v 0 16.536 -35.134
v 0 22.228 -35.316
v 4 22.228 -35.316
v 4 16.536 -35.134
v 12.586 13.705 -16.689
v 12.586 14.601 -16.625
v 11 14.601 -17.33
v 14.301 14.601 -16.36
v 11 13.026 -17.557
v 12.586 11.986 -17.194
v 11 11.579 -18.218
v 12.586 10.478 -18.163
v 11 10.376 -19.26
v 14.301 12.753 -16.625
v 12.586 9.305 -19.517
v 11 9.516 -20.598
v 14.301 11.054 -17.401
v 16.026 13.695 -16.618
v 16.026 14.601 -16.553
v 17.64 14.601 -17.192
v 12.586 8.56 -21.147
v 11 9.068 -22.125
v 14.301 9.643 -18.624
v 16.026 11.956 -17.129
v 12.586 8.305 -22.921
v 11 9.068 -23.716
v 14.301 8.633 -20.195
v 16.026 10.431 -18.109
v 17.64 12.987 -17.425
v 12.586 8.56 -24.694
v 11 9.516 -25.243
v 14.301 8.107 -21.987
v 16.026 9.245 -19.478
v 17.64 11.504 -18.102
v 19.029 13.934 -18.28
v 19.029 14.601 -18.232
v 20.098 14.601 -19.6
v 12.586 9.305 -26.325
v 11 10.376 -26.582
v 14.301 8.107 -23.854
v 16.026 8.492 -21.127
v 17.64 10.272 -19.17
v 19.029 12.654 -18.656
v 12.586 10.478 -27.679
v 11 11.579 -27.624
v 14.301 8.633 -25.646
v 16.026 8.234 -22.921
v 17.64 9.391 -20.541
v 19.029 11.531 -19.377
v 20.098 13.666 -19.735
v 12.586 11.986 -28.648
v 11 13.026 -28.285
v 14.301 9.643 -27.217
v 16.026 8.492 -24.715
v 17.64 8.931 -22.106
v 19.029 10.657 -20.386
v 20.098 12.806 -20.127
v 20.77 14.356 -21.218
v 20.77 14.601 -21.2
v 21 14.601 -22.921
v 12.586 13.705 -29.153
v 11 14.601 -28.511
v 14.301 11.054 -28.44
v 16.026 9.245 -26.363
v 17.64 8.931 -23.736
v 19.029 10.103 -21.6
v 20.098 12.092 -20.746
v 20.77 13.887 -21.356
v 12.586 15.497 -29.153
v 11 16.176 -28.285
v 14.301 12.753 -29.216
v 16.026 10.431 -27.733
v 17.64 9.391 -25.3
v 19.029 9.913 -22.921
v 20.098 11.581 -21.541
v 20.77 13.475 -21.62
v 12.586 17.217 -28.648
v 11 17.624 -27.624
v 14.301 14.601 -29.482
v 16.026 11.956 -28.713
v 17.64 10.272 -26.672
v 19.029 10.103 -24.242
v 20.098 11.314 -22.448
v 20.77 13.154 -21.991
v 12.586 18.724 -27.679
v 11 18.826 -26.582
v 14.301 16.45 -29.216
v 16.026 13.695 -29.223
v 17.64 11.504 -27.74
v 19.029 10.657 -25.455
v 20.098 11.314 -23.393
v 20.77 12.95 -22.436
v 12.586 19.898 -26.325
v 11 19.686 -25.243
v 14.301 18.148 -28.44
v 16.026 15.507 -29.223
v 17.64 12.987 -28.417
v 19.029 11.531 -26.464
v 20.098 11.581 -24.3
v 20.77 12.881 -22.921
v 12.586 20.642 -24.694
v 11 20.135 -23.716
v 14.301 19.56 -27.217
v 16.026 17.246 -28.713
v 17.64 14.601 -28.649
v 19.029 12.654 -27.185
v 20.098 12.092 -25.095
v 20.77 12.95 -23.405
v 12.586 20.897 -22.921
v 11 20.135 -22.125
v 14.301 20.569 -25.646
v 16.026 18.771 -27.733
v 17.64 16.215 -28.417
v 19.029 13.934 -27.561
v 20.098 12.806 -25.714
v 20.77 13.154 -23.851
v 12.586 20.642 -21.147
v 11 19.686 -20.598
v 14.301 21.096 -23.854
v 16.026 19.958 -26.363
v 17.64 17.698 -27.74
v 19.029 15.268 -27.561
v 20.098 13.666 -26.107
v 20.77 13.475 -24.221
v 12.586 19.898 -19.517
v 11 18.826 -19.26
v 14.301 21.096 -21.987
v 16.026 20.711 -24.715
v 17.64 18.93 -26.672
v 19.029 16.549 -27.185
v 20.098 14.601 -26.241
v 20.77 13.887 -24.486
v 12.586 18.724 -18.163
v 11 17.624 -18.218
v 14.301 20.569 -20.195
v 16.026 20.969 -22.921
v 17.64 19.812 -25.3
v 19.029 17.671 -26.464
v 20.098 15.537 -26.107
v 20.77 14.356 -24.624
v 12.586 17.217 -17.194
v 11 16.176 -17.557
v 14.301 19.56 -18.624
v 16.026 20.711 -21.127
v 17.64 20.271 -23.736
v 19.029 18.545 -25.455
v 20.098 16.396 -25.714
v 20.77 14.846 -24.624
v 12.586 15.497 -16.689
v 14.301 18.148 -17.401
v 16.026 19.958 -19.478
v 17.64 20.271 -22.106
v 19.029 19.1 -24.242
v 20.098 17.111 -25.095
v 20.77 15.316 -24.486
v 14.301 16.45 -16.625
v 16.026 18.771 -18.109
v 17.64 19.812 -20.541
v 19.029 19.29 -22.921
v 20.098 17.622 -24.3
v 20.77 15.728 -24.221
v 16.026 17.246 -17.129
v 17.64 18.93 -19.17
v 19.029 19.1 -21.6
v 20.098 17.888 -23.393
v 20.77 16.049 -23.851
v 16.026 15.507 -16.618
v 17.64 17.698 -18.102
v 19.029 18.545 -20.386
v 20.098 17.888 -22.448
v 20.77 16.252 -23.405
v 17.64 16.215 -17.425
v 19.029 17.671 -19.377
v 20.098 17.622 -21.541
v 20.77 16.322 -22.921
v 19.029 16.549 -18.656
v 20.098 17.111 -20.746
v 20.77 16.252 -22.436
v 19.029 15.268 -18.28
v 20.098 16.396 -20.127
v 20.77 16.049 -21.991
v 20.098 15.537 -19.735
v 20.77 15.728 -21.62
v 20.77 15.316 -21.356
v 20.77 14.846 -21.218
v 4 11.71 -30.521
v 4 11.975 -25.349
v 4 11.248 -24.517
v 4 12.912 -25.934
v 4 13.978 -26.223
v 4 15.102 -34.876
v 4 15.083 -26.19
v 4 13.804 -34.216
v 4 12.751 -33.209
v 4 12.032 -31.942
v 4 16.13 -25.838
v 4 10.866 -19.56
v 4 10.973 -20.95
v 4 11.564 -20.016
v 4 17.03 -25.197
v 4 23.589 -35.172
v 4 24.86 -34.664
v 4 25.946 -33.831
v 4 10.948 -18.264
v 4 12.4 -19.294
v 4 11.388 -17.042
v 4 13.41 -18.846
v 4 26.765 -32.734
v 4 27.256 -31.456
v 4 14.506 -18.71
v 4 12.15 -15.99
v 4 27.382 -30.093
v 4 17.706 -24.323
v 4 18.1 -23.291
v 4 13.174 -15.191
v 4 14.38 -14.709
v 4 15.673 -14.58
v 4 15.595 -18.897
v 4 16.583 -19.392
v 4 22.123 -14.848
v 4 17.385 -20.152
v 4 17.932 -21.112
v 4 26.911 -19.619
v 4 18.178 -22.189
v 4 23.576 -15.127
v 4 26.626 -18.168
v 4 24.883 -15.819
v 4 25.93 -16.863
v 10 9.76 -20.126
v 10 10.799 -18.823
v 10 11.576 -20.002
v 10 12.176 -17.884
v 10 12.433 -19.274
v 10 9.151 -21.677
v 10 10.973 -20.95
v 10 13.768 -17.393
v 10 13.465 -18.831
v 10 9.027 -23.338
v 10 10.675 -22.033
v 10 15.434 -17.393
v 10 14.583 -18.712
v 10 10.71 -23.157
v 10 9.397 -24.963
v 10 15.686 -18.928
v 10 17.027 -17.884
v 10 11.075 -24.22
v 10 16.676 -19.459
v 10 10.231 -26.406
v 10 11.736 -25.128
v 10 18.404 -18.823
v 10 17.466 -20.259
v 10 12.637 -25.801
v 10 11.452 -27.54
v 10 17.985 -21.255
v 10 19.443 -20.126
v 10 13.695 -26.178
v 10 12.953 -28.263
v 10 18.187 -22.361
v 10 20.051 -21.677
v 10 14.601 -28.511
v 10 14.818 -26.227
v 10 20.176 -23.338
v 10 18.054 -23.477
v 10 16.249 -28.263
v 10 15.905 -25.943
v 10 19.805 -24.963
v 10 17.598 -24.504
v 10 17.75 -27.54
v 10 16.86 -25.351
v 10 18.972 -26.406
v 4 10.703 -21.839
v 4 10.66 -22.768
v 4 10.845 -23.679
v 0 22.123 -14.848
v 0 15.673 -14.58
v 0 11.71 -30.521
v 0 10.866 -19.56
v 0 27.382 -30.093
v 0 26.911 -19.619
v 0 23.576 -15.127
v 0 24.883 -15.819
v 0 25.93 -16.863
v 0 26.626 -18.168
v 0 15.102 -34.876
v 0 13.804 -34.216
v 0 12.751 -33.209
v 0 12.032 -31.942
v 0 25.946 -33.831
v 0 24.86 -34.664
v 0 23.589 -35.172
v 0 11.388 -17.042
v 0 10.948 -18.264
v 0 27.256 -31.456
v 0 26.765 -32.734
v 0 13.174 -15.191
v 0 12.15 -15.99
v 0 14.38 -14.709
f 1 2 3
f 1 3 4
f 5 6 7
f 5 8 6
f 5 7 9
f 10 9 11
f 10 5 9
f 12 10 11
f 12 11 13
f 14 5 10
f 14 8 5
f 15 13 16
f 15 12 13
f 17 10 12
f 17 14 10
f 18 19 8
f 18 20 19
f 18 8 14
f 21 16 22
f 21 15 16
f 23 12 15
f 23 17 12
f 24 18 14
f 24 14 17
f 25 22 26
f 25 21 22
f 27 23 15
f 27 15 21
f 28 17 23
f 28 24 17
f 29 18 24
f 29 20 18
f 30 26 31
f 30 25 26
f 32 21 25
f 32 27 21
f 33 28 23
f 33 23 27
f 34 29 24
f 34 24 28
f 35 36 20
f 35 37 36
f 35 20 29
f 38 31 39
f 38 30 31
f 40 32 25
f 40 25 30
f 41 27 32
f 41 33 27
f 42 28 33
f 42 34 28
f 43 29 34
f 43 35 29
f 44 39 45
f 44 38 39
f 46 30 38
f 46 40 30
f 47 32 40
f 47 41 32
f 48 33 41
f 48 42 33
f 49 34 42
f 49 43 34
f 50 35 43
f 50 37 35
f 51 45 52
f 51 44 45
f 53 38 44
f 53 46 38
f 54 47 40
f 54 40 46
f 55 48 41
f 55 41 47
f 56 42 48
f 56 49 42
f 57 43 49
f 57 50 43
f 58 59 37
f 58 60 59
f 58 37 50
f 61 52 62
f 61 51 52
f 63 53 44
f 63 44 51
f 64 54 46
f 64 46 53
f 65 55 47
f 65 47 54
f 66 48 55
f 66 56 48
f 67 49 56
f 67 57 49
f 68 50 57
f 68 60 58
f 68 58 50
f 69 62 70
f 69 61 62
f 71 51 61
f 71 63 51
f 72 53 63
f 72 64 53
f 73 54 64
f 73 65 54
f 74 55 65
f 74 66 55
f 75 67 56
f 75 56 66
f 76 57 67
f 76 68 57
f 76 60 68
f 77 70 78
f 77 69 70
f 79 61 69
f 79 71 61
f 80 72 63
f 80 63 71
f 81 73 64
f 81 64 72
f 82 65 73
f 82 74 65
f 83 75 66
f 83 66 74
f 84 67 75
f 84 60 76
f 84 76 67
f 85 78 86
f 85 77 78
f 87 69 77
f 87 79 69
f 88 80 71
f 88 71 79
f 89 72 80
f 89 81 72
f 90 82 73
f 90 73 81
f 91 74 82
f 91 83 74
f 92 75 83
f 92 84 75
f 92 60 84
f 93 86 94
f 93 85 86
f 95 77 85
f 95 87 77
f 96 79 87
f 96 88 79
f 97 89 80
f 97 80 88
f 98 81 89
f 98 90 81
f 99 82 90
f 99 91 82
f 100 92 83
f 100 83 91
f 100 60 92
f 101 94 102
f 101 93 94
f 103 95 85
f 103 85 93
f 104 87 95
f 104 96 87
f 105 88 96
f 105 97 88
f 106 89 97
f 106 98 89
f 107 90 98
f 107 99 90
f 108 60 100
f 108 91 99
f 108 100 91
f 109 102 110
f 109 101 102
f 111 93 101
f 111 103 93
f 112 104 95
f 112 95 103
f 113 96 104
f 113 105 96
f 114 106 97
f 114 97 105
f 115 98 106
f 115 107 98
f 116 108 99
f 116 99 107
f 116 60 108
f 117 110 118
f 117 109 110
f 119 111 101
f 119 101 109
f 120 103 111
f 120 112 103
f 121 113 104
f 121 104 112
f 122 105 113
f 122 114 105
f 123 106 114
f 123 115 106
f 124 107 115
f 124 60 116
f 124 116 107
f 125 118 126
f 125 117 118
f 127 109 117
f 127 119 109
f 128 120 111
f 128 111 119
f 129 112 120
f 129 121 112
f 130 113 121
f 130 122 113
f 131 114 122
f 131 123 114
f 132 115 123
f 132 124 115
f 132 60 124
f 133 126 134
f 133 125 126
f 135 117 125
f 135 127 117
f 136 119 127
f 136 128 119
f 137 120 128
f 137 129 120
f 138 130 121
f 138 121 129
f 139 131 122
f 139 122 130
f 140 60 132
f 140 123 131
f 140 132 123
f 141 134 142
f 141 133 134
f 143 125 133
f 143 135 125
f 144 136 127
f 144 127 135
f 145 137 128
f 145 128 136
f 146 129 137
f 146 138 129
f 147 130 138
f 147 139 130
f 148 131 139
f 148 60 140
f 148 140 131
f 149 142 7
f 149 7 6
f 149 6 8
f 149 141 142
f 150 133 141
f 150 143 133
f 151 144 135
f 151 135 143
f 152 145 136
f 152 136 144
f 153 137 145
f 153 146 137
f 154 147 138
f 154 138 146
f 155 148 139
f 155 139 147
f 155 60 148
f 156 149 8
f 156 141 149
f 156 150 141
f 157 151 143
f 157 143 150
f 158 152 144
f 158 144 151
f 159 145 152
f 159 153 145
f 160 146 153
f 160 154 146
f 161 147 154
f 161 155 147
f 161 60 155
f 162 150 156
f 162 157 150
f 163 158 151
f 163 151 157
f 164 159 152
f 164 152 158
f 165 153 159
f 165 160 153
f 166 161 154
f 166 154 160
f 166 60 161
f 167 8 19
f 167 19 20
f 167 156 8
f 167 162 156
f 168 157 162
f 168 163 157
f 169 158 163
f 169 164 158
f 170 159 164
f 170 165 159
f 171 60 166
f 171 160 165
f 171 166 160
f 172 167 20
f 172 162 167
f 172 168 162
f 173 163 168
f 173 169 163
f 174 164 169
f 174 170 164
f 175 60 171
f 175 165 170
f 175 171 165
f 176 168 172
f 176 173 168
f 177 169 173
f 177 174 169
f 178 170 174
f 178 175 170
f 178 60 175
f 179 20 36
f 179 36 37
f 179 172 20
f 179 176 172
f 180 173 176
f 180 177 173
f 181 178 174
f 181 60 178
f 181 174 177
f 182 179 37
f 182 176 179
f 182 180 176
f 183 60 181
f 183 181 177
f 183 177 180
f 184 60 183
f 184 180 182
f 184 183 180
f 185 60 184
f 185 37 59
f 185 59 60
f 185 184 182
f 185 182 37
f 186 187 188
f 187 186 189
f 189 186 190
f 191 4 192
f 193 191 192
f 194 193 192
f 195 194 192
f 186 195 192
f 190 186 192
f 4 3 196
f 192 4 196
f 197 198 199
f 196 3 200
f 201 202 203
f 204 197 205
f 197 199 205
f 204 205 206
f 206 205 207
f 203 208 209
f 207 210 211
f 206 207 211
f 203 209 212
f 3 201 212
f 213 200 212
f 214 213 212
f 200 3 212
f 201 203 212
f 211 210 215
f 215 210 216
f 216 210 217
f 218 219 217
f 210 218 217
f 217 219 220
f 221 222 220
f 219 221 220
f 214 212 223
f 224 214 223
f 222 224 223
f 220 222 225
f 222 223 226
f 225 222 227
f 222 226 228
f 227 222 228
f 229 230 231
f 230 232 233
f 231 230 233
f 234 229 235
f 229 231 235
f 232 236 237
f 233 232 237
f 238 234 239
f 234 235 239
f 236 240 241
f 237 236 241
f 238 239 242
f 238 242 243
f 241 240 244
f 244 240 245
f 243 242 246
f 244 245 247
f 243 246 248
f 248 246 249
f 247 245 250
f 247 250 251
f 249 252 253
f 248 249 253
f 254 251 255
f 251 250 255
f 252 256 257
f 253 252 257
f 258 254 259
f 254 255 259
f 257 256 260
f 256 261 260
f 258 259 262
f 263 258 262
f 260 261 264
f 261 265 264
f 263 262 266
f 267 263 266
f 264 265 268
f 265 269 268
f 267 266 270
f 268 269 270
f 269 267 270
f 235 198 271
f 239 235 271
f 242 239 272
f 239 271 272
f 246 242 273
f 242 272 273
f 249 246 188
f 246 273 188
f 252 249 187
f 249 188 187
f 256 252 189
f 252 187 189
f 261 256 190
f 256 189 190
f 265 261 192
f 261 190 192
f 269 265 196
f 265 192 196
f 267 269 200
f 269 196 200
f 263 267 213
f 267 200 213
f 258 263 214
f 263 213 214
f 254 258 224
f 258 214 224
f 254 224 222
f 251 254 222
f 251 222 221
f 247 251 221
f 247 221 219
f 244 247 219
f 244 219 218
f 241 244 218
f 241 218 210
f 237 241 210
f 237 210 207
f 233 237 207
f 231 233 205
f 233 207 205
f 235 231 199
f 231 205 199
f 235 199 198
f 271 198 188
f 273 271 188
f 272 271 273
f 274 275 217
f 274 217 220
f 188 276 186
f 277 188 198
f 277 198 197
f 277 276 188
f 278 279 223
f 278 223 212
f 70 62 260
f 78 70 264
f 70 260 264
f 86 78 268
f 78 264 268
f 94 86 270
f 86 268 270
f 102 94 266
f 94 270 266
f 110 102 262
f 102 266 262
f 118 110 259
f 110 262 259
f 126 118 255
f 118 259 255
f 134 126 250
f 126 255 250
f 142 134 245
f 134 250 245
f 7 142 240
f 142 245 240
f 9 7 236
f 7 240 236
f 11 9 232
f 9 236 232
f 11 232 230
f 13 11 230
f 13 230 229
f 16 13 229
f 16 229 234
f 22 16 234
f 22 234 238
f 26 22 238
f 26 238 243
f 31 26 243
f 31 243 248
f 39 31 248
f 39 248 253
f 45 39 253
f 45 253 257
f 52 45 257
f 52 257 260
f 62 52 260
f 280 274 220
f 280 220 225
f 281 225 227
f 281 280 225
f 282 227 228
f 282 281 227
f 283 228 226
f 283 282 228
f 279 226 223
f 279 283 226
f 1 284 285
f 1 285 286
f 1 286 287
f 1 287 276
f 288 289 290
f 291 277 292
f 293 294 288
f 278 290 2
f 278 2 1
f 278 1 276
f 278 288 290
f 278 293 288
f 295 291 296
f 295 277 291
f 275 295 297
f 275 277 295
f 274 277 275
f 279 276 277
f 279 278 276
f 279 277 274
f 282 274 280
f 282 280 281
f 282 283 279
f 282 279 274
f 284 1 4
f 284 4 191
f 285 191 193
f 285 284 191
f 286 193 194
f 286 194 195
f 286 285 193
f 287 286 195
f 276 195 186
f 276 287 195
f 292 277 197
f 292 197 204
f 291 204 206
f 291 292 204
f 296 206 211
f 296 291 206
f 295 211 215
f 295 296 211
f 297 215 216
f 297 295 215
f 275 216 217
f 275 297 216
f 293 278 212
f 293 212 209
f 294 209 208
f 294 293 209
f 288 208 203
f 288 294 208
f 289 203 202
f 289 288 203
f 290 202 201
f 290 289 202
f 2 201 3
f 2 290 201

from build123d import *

# Parameters (mm, degrees)
BOSS_EXTRUDE1_DEPTH = 4
SKETCH2_R           = 3.769998475
BOSS_EXTRUDE3_DEPTH = 6
SKETCH3_R           = 5.590277894
BOSS_EXTRUDE4_DEPTH = 1
DOME2_FACE_RADIUS   = 5.590277894
DOME2_HEIGHT        = 10


with BuildPart() as part:
    # Sketch1 → Boss-Extrude1 (new body)
    with BuildSketch(Plane(origin=(0, 0, 0), x_dir=(0, 0, -1), z_dir=(1, 0, 0))):
        with BuildLine():
            Line((19.618899977, 26.910578021), (30.093333643, 27.382443553))
            ThreePointArc((30.093333643, 27.382443553), (33.830584617, 25.946191816), (35.315810998, 22.228132309))
            Line((35.315810998, 22.228132309), (35.134279712, 16.536003005))
            ThreePointArc((35.134279712, 16.536003005), (33.751052045, 13.24033598), (30.52098964, 11.710160572))
            Line((30.52098964, 11.710160572), (19.560243471, 10.86550754))
            ThreePointArc((19.560243471, 10.86550754), (15.990018512, 12.15019262), (14.579969631, 15.672788846))
            Line((14.579969631, 15.672788846), (14.848236342, 22.1234032))
            ThreePointArc((14.848236342, 22.1234032), (16.302281821, 25.445064899), (19.618899977, 26.910578021))
        make_face()
    extrude(amount=BOSS_EXTRUDE1_DEPTH)

    # Sketch2 → Boss-Extrude3 (add)
    with BuildSketch(Plane(origin=(4, 0, 0), x_dir=(0, 0, -1), z_dir=(1, 0, 0))):
        with Locations(Location((22.478500698, 14.418661265, 0), (0, 0, 246.075553506))):
            Circle(SKETCH2_R)
    extrude(amount=BOSS_EXTRUDE3_DEPTH)

    # Sketch3 → Boss-Extrude4 (add)
    with BuildSketch(Plane(origin=(10, 0, 0), x_dir=(0, 0, -1), z_dir=(1, 0, 0))):
        with Locations((22.920717482, 14.60121679)):
            Circle(SKETCH3_R)
    extrude(amount=BOSS_EXTRUDE4_DEPTH)

    # Dome2: a dome of height H over a round flat face of radius A is a cap of a sphere of radius (A * A + H * H) / (2 * H)
    dome2_r = (DOME2_FACE_RADIUS * DOME2_FACE_RADIUS + DOME2_HEIGHT * DOME2_HEIGHT) / (2 * DOME2_HEIGHT)
    dome2_base = Plane((11, 14.60121679, -22.920717482), z_dir=(1, 0, 0))
    with Locations(dome2_base.offset(DOME2_HEIGHT - dome2_r)):
        dome2_ball = Sphere(dome2_r, mode=Mode.PRIVATE)
    add(split(dome2_ball, bisect_by=dome2_base, keep=Keep.TOP, mode=Mode.PRIVATE))


solid = part.part
